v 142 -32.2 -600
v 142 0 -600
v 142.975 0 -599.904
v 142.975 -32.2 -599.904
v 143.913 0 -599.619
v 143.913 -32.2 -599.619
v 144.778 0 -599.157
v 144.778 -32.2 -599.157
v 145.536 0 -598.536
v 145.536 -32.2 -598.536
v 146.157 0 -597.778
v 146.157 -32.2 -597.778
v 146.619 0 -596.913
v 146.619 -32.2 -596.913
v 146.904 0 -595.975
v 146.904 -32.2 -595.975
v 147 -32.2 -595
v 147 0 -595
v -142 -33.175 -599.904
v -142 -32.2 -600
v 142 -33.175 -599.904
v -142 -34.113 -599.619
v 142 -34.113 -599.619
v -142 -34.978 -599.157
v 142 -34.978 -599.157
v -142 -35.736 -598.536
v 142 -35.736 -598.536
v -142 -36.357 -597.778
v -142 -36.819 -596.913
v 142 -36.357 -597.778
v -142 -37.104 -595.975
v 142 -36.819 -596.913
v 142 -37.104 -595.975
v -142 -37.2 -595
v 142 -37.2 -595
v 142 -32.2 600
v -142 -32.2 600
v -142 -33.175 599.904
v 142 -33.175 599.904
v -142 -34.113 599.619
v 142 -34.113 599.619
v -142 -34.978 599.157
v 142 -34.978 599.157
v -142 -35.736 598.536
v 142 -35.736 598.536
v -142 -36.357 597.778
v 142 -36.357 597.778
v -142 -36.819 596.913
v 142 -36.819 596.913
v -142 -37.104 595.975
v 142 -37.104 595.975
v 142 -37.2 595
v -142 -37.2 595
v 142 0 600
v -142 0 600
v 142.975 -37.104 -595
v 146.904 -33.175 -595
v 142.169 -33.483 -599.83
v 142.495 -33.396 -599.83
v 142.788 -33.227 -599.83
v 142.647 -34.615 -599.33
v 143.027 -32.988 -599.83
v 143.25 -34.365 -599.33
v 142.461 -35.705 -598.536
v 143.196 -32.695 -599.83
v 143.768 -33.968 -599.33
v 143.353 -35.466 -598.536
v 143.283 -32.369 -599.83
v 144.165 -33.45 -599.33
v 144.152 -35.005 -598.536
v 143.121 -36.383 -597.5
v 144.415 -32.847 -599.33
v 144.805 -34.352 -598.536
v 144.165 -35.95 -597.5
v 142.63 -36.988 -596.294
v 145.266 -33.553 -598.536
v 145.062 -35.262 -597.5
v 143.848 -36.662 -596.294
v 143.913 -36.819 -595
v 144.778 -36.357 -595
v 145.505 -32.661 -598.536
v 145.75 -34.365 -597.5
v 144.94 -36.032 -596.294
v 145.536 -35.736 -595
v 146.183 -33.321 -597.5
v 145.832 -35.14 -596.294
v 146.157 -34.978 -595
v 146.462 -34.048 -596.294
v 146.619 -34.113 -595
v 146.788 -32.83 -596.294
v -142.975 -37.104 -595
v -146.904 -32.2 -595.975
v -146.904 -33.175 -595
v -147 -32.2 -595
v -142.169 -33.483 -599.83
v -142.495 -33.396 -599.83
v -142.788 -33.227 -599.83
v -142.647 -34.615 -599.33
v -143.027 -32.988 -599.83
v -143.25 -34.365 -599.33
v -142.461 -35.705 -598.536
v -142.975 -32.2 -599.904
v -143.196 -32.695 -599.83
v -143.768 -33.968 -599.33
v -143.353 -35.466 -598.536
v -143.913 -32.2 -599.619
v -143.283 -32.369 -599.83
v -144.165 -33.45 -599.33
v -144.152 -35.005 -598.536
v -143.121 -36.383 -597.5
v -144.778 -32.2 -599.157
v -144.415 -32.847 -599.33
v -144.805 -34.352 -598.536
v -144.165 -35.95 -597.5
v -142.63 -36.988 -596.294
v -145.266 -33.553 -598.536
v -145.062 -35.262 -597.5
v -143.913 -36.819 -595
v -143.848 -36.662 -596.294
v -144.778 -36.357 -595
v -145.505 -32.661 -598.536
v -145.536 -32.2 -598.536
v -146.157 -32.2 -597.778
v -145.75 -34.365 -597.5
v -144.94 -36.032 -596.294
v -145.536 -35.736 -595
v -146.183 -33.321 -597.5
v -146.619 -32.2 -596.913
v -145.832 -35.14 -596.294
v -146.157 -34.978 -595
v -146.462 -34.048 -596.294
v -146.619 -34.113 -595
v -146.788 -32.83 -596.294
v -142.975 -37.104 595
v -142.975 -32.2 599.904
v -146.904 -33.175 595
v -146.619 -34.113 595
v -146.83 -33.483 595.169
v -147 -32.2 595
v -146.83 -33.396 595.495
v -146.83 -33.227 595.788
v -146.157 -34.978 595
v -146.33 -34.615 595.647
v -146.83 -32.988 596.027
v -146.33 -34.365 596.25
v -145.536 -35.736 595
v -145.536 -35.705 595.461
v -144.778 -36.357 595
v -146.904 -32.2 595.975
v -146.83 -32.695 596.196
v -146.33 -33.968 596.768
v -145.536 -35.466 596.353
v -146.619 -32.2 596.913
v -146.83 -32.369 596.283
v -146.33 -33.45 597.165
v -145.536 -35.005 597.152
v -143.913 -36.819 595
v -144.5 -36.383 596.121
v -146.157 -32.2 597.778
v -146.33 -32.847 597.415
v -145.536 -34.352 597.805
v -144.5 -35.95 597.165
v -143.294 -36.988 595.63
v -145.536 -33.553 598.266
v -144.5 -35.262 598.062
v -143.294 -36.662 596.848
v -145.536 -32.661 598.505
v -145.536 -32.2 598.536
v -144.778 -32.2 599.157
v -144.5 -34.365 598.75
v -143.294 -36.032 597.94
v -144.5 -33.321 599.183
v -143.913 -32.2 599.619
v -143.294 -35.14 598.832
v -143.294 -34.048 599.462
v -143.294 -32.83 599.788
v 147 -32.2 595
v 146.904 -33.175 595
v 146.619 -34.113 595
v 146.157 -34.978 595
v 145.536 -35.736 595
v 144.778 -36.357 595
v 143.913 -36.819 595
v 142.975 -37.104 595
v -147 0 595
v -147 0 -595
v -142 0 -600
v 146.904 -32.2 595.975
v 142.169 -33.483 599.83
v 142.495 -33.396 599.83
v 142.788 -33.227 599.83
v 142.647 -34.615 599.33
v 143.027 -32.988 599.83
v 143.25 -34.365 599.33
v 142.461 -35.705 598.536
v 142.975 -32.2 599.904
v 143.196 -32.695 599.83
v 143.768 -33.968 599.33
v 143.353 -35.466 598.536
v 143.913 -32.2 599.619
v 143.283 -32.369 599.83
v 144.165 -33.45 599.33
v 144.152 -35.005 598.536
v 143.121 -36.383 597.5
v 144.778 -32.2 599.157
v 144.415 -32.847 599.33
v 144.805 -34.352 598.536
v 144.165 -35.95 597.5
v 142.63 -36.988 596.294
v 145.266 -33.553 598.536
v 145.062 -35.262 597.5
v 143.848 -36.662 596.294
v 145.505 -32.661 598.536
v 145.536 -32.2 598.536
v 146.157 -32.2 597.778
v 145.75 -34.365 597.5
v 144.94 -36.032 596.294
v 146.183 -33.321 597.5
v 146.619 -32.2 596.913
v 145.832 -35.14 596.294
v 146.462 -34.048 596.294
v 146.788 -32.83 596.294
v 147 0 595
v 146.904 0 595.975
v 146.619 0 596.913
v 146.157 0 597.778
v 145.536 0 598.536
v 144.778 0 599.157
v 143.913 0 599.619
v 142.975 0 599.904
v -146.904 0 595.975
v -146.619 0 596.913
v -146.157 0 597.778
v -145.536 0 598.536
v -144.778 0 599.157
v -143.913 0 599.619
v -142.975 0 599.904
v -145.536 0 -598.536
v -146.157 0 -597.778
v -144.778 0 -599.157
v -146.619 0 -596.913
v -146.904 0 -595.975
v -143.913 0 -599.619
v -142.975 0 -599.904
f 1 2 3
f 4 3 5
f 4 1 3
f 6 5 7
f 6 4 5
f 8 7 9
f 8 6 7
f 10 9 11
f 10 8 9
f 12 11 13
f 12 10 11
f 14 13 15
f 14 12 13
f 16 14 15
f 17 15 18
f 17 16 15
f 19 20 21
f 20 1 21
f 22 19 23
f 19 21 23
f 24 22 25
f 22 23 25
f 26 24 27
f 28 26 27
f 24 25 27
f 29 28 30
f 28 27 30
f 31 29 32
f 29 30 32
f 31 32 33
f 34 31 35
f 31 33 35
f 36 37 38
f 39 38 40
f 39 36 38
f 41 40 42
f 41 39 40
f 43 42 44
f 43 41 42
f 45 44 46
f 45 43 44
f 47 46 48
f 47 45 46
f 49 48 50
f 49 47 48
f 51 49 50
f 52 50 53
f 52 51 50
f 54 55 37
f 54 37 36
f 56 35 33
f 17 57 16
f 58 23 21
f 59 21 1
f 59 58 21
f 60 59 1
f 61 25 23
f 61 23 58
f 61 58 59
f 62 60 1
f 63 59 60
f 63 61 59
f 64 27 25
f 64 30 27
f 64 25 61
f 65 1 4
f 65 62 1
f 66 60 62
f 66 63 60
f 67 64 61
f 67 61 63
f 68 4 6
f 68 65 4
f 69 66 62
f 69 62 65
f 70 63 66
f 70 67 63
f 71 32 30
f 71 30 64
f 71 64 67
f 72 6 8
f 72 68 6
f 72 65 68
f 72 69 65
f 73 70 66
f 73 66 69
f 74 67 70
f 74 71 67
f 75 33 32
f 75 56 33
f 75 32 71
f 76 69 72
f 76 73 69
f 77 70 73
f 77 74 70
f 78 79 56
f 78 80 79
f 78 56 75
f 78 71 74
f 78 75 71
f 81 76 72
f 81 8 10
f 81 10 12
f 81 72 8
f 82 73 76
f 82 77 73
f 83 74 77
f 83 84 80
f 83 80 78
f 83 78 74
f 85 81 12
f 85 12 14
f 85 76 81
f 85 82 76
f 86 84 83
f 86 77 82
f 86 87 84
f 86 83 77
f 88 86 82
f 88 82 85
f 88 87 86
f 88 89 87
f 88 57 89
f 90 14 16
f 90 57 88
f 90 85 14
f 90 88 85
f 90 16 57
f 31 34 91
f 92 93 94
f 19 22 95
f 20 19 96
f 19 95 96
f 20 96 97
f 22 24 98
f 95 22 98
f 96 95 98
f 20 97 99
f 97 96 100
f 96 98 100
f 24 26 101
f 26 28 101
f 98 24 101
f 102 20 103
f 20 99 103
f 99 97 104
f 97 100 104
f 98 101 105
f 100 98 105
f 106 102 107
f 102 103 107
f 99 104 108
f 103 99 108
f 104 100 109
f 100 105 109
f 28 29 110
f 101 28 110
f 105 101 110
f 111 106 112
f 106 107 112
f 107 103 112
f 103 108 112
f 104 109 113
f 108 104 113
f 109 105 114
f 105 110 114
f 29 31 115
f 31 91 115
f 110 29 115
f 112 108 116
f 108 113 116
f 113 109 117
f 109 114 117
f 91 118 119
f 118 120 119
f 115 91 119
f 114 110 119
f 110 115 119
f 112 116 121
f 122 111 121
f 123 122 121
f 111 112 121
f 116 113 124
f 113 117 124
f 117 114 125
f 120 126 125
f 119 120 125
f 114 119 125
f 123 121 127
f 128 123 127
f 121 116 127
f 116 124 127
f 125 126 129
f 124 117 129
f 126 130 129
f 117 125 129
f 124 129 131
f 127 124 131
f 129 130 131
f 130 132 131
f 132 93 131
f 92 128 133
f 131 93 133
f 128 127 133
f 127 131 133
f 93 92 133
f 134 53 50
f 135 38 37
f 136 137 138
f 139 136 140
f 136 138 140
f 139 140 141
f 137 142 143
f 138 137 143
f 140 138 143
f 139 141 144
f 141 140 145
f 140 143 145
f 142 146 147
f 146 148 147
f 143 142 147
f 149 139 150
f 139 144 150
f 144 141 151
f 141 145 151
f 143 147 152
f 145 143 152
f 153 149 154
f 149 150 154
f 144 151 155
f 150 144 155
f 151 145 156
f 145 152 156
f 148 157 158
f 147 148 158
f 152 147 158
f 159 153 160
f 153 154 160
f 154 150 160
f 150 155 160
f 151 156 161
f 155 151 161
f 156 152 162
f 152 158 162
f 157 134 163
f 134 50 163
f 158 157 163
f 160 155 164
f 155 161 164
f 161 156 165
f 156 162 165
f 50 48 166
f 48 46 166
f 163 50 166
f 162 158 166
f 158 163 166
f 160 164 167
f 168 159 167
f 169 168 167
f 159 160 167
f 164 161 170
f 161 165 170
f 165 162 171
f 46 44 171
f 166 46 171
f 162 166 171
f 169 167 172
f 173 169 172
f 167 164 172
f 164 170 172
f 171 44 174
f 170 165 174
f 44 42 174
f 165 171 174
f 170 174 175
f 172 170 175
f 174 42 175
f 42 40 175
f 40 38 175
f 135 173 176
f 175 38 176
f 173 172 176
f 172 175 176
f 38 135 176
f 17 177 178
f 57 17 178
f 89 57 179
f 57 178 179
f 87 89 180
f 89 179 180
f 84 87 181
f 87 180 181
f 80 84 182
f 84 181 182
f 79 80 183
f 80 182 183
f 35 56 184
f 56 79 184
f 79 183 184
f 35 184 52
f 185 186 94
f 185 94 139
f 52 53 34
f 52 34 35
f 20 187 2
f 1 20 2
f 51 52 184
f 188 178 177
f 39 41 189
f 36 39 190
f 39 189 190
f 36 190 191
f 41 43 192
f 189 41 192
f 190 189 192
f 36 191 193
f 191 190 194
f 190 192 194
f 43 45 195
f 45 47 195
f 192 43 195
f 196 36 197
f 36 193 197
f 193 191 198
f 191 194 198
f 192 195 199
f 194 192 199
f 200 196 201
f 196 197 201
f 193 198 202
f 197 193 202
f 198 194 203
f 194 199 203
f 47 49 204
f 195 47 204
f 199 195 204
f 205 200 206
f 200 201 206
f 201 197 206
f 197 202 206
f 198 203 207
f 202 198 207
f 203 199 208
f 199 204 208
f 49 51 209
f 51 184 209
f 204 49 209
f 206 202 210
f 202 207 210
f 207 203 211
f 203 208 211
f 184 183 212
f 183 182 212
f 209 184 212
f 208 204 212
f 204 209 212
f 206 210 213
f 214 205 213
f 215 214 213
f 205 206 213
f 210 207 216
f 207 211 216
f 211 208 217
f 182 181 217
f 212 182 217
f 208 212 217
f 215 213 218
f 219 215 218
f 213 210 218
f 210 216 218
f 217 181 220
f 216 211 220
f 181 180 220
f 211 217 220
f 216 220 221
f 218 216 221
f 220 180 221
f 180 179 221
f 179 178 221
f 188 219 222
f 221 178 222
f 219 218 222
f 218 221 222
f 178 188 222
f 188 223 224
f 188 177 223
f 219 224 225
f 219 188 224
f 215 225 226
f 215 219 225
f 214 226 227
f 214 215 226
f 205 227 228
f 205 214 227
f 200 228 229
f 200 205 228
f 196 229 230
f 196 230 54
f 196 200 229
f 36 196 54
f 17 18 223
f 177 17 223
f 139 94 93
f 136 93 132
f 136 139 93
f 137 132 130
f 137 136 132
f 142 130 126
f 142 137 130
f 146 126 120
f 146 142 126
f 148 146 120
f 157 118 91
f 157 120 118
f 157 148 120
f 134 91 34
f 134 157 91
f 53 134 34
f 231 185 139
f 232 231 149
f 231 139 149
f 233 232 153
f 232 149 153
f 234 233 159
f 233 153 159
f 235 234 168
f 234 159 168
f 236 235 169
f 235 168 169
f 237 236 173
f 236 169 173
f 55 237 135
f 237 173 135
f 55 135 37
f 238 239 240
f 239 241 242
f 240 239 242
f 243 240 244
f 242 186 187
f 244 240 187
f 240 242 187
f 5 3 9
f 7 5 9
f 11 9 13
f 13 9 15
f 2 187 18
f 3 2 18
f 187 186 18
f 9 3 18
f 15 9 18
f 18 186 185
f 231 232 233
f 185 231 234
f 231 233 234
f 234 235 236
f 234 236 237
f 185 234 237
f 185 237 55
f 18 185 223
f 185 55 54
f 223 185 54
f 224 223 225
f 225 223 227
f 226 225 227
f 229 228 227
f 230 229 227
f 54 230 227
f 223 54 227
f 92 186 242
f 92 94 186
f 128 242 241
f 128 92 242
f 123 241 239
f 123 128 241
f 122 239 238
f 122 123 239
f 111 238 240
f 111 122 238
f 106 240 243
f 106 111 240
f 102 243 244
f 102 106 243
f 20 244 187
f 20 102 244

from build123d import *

# Parameters (mm, degrees)
F0_W     = 294
F0_H     = 1200
F1_DEPTH = 37.2
F2_R     = 5


with BuildPart() as f1:
    # F0 (on Front) → F1 (new body)
    with BuildSketch(Plane.XZ):
        Rectangle(F0_W, F0_H)
    extrude(amount=F1_DEPTH)

    # F2
    f2_edges = [f1.edges().sort_by_distance(p)[0] for p in [
        (147, -37.2, 0),
        (0, -37.2, 600),
        (-147, -37.2, 0),
        (0, -37.2, -600),
        (-147, -18.6, 600),
        (147, -18.6, 600),
        (147, -18.6, -600),
        (-147, -18.6, -600),
    ]]
    fillet(f2_edges, radius=F2_R)


solid = f1.part
